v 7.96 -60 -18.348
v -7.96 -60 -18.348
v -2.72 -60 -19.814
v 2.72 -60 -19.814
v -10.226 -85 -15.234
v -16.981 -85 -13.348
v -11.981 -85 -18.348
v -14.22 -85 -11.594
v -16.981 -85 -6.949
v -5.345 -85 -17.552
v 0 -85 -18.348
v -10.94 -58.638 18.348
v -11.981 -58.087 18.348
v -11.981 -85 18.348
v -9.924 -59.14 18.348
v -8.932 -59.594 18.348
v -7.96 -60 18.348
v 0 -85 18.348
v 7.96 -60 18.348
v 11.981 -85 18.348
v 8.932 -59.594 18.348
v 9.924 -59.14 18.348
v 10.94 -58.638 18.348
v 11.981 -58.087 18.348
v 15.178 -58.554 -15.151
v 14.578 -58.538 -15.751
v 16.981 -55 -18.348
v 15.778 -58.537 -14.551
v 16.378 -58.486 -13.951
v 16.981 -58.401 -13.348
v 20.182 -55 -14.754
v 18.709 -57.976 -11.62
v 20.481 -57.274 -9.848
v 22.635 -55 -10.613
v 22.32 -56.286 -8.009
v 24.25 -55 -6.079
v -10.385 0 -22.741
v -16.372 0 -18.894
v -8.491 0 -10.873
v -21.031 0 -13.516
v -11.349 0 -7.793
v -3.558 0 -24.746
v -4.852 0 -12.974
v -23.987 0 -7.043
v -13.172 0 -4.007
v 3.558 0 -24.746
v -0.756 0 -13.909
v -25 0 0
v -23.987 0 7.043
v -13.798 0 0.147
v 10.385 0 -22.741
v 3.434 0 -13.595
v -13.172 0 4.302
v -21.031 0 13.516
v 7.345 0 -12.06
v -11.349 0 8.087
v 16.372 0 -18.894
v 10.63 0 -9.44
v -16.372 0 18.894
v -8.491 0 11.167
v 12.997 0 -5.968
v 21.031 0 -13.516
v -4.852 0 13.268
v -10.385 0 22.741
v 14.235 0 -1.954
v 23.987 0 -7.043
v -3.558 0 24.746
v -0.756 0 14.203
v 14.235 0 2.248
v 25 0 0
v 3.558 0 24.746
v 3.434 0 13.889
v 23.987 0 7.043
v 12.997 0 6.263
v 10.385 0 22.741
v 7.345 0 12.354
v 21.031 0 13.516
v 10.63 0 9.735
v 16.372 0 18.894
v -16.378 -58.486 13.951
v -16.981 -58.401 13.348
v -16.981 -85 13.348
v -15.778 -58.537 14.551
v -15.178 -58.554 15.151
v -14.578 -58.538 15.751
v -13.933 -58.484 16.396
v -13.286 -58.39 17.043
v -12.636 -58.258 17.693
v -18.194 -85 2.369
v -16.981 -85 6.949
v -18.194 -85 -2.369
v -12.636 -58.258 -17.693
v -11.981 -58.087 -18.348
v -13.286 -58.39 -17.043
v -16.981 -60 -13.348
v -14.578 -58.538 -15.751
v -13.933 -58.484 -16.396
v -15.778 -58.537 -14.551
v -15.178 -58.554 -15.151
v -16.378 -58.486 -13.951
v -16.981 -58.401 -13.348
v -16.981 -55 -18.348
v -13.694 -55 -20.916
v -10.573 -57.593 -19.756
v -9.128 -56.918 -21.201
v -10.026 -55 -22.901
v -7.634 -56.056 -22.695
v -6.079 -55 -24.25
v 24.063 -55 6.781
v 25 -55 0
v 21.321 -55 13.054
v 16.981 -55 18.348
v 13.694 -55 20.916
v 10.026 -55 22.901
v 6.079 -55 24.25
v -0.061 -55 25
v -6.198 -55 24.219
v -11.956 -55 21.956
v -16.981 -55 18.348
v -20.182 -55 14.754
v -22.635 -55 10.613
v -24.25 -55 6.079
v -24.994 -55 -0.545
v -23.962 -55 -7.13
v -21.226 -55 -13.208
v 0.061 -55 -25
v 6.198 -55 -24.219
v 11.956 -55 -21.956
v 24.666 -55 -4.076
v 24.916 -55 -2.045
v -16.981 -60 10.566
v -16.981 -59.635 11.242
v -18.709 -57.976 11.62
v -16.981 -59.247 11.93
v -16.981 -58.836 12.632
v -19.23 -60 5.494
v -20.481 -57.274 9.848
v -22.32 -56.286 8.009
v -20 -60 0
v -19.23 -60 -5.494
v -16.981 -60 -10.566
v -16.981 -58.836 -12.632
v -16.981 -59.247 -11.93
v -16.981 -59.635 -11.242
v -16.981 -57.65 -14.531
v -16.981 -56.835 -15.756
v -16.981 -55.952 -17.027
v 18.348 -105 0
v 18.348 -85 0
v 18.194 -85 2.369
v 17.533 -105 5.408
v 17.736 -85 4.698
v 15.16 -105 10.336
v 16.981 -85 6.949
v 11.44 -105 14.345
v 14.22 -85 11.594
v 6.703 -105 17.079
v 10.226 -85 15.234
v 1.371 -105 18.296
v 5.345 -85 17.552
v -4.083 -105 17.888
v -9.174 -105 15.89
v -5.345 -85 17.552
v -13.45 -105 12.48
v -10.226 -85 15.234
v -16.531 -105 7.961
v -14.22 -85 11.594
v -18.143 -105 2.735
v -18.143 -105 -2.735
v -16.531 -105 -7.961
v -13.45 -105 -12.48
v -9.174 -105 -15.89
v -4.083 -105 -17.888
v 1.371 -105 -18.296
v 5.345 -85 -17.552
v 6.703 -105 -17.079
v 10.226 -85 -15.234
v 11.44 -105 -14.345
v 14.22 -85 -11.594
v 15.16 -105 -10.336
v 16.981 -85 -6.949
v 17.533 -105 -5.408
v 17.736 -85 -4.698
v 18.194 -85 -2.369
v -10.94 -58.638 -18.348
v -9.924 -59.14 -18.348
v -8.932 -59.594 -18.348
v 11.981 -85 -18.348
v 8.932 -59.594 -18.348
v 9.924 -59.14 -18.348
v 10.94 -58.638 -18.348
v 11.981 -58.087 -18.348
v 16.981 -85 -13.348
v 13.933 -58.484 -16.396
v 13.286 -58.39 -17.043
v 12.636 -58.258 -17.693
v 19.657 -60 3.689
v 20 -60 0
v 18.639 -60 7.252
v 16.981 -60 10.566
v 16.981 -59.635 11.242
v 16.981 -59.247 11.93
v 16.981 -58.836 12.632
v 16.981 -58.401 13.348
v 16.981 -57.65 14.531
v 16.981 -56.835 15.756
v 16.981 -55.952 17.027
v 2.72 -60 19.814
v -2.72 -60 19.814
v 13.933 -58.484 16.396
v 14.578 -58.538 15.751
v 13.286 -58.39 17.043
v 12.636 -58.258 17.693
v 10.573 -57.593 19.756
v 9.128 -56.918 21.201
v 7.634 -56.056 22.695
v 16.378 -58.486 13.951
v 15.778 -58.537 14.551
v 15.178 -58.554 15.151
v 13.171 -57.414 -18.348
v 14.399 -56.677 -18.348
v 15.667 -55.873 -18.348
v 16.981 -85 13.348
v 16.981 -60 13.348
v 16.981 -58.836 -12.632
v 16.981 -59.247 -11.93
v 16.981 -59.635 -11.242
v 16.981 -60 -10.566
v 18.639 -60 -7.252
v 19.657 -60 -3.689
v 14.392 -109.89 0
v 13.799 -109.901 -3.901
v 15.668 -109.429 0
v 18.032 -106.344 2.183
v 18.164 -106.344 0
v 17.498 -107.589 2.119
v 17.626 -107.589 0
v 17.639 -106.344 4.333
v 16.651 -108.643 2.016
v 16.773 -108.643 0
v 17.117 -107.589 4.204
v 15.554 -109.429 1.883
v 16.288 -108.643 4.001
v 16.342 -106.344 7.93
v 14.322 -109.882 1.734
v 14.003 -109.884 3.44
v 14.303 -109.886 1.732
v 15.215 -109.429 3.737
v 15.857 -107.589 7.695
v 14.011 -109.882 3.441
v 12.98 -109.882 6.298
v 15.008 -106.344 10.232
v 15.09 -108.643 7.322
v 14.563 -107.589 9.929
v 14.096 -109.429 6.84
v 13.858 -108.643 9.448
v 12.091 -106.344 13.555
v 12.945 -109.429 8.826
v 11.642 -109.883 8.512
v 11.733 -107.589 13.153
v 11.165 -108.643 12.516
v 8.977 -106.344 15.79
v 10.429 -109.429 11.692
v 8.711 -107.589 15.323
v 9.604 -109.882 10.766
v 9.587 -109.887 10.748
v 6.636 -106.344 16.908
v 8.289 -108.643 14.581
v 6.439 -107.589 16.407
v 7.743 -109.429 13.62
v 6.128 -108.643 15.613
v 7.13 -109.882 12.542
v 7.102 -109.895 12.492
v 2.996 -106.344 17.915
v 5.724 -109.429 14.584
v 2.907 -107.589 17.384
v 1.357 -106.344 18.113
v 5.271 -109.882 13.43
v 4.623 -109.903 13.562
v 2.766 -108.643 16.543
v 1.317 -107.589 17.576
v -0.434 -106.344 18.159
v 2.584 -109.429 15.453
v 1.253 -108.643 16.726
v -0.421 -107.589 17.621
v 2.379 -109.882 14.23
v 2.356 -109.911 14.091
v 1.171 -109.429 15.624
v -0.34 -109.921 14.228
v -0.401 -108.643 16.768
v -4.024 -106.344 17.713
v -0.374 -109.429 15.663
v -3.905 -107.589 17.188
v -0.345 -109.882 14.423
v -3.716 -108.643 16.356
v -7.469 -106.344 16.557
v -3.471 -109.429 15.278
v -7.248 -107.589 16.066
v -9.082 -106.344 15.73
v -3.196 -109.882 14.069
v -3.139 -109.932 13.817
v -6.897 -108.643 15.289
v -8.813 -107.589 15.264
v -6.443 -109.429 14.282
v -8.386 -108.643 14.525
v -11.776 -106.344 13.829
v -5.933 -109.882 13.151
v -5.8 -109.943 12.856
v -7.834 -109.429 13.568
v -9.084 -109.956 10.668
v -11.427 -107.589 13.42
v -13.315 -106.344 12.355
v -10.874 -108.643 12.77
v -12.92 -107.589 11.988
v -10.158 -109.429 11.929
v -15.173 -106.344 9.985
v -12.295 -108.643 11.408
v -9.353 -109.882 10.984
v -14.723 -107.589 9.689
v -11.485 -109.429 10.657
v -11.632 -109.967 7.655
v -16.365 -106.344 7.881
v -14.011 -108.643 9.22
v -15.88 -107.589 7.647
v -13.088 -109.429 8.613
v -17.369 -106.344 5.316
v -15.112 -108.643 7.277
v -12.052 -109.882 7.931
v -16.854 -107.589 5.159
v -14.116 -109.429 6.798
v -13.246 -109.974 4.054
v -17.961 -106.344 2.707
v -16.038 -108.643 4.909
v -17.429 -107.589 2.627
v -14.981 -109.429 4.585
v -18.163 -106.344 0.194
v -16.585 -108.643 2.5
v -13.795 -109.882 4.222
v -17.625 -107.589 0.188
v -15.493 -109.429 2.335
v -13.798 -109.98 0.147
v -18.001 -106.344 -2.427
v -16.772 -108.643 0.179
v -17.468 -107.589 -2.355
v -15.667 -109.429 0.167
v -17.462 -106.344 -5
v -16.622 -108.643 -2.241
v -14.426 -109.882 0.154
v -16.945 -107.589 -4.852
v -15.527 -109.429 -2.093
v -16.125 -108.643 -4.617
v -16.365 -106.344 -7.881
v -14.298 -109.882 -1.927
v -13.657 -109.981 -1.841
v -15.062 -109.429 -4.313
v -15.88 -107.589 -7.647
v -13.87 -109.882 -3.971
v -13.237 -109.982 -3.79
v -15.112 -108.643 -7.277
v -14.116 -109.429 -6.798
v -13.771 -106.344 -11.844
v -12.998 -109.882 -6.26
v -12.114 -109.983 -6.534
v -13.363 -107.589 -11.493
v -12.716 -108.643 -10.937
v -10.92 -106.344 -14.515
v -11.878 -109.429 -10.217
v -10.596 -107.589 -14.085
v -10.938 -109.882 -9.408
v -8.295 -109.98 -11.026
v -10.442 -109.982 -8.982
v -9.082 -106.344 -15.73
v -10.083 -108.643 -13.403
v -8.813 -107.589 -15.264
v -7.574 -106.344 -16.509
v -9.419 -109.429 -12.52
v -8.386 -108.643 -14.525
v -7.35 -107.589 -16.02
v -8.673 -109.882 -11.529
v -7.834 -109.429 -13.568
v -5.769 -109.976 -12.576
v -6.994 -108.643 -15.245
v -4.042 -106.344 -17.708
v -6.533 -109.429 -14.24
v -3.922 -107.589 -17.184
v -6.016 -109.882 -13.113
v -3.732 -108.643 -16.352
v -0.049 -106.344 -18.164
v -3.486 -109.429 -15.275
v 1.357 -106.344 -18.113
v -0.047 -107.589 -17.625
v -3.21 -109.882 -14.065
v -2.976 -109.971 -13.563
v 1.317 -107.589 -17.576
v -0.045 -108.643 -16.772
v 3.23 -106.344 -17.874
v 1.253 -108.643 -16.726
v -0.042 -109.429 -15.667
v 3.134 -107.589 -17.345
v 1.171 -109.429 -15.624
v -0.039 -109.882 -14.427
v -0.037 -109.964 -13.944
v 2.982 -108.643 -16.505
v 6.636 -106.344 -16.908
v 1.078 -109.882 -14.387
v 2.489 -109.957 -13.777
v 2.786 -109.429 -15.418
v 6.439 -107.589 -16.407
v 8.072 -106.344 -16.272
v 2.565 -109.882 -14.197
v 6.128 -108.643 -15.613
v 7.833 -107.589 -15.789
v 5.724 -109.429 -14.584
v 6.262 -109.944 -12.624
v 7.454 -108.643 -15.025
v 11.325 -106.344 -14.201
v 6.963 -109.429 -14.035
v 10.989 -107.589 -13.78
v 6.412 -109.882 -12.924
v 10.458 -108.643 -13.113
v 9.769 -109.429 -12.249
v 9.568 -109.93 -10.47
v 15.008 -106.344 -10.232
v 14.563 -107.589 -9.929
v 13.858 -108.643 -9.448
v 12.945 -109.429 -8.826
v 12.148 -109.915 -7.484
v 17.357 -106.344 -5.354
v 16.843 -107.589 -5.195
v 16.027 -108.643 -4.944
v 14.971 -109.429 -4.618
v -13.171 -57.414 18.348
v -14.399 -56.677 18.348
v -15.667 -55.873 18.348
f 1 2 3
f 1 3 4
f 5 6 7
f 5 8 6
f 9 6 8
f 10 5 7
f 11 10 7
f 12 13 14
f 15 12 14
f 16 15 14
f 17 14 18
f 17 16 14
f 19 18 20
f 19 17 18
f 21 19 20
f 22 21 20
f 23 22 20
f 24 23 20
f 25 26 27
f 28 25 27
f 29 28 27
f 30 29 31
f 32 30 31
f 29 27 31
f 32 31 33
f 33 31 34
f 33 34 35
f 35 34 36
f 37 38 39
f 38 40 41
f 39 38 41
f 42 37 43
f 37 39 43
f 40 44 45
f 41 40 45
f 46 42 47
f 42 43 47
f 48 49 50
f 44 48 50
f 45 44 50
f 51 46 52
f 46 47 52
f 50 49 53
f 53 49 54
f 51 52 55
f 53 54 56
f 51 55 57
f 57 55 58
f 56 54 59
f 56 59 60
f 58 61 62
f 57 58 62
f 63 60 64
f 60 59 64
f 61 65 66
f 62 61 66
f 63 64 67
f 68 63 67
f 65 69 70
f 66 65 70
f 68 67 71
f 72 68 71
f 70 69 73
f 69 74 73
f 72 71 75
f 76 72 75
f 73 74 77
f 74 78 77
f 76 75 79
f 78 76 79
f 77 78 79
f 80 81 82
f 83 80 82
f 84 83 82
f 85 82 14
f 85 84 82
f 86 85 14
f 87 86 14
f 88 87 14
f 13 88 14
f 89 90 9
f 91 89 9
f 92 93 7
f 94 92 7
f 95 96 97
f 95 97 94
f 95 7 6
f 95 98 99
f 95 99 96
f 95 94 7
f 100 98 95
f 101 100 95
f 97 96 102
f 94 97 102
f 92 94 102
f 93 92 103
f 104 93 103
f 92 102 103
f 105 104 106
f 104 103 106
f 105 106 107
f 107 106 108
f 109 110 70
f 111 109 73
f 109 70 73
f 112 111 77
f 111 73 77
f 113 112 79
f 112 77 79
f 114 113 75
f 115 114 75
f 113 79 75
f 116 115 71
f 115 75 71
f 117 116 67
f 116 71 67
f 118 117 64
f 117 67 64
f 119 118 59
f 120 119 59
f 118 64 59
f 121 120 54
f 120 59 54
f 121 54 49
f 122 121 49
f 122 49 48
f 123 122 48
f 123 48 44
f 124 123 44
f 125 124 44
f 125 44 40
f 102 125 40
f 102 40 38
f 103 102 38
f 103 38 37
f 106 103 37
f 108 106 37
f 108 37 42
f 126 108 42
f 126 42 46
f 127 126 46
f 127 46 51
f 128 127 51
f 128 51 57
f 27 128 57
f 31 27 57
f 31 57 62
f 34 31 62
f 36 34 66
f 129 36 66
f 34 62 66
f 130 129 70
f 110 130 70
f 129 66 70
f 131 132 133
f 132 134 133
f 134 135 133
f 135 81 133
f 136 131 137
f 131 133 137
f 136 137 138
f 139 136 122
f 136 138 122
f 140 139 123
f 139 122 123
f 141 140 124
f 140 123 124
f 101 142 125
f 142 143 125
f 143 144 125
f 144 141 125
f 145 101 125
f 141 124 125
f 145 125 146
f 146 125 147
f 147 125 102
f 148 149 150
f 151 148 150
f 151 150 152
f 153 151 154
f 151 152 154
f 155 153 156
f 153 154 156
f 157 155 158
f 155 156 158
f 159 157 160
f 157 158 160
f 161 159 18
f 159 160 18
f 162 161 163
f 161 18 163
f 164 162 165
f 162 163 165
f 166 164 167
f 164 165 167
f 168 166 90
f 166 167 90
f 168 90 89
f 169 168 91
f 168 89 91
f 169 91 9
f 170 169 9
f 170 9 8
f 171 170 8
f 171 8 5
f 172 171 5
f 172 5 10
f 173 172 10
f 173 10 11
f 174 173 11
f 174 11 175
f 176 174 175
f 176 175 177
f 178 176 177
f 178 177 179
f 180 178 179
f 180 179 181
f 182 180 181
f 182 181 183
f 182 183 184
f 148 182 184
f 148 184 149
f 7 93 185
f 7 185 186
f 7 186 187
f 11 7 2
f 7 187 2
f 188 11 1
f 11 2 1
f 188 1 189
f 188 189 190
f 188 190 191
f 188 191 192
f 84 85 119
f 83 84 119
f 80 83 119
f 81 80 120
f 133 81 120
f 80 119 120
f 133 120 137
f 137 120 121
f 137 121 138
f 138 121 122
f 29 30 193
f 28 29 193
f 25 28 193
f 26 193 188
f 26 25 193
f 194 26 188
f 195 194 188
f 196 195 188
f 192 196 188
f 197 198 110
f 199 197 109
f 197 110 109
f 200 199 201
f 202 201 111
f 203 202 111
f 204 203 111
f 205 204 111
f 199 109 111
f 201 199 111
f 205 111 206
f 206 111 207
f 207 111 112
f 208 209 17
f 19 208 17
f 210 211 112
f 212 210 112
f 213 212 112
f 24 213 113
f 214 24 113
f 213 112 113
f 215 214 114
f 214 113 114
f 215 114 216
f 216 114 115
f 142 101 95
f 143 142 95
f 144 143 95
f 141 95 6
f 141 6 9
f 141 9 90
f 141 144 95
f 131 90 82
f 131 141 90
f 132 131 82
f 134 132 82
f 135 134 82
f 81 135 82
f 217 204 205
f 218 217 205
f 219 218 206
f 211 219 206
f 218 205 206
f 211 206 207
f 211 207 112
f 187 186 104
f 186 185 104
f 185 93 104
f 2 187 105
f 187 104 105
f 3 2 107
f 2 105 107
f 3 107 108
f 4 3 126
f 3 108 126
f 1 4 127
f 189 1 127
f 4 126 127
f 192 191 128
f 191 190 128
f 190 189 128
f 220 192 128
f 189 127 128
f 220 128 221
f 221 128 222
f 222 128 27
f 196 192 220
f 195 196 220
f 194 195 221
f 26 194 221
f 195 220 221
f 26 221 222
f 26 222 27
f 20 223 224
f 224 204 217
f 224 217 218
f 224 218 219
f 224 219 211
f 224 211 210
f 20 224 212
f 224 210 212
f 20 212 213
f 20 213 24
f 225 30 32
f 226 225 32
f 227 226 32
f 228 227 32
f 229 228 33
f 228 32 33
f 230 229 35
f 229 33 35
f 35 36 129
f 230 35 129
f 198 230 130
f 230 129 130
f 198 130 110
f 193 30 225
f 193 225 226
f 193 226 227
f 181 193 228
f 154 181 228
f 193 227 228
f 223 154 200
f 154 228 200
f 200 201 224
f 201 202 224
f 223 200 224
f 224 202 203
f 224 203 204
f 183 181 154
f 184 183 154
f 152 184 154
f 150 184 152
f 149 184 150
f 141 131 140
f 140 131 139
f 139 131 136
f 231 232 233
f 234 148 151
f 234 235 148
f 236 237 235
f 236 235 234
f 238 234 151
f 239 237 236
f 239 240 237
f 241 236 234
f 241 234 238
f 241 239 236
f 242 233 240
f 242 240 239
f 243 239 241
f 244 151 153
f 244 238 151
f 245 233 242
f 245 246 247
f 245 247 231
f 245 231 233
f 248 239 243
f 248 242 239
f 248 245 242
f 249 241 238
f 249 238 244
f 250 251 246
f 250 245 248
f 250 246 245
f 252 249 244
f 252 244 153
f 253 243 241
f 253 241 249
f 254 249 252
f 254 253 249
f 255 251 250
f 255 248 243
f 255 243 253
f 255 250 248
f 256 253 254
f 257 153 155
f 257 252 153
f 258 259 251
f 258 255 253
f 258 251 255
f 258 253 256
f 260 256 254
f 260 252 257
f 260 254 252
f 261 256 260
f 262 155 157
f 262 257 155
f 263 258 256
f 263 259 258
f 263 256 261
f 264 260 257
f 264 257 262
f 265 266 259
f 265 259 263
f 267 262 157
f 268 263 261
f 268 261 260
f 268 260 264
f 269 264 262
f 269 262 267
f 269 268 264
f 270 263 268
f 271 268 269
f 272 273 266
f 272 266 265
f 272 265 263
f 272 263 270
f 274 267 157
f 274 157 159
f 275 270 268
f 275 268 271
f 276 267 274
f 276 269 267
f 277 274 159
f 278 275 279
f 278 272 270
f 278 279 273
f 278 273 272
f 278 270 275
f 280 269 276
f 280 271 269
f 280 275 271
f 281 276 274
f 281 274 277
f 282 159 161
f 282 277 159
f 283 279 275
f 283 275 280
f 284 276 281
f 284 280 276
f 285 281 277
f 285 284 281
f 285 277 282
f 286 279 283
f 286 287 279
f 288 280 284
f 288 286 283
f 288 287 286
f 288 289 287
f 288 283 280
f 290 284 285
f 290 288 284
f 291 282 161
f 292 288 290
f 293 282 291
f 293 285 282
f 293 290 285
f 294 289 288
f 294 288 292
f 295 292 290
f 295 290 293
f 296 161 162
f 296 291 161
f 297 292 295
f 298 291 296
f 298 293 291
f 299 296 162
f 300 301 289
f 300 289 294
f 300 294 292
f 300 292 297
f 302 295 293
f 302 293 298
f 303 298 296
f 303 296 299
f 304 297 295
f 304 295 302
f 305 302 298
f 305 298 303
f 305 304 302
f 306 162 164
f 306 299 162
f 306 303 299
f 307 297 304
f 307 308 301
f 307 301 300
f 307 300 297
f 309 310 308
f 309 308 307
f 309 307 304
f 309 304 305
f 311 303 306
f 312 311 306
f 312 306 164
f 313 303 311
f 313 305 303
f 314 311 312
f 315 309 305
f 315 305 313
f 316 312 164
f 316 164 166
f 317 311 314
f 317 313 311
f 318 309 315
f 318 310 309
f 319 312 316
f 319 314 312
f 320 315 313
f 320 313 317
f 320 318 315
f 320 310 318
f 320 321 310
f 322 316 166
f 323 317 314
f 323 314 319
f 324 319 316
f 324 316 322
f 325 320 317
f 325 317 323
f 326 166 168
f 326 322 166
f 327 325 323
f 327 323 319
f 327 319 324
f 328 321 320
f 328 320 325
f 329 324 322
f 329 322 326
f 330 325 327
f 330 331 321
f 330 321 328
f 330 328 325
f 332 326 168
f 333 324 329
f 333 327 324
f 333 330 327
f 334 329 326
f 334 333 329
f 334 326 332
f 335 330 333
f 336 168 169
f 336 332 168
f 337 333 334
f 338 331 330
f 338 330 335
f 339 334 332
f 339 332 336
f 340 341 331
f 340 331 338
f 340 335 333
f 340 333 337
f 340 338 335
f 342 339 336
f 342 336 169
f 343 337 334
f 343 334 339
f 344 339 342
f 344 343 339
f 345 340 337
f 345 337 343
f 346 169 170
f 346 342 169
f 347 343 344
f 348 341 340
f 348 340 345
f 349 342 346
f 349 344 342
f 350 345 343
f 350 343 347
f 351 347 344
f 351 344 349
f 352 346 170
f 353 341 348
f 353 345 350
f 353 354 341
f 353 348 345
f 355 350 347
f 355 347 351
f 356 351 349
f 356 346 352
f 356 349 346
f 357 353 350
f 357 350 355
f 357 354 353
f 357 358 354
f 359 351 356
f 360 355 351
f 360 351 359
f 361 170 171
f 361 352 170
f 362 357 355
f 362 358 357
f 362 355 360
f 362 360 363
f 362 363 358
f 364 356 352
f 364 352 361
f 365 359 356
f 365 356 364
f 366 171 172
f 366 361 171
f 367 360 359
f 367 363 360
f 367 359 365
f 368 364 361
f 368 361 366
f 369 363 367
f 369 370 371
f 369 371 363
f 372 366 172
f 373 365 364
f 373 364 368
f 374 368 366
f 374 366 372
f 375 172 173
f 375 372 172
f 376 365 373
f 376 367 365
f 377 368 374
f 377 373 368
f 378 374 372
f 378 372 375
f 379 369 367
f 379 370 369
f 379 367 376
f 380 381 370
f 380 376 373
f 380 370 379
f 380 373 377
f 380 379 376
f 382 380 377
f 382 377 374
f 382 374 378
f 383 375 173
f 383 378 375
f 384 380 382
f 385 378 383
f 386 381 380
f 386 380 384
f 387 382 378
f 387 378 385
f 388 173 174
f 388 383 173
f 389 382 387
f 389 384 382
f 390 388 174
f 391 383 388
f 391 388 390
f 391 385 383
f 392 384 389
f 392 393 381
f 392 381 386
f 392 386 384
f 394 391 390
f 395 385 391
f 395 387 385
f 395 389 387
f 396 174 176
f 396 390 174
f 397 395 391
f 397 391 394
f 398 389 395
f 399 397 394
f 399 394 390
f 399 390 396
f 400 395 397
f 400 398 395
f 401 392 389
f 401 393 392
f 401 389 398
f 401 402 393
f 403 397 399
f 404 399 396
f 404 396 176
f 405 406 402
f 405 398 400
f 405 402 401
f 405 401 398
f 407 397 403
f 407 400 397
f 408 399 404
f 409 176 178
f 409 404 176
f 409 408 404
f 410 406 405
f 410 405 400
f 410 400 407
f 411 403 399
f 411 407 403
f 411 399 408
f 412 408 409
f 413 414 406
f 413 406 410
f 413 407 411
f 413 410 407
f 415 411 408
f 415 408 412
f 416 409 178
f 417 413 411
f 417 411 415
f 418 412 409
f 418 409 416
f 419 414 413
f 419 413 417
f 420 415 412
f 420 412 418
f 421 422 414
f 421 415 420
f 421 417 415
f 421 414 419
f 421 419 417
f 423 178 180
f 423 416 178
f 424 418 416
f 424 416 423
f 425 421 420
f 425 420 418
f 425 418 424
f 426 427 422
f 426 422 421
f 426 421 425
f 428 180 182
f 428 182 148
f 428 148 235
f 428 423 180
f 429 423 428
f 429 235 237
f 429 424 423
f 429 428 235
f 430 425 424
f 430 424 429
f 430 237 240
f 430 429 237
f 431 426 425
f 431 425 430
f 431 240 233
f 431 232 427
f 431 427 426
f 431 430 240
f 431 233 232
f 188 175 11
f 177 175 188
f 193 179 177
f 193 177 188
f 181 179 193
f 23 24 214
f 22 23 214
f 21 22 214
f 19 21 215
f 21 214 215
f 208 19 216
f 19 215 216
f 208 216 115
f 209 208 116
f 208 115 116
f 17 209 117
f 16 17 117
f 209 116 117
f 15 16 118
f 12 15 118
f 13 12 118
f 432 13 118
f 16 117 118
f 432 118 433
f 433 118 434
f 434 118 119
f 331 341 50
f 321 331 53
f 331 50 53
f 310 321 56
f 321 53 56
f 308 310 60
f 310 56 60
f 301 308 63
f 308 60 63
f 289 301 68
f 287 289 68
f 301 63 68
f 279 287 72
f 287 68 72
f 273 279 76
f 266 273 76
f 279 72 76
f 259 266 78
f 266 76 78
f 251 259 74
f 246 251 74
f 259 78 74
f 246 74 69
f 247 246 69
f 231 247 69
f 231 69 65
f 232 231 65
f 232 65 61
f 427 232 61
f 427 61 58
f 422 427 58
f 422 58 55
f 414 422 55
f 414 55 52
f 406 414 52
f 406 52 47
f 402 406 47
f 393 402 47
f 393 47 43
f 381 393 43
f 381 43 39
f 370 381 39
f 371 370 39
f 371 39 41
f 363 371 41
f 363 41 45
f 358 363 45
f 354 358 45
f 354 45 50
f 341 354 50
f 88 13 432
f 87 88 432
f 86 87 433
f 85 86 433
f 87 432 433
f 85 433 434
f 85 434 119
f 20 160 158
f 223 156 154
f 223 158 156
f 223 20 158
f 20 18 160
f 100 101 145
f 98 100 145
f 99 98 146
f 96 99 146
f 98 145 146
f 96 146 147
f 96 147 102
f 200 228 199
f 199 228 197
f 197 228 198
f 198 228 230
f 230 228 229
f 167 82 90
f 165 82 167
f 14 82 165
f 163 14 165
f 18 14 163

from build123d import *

# Parameters (mm, degrees)
F0_R         = 25
F1_DEPTH     = 60
F2_W         = 33.9622593881
F2_H         = 36.695571085
F3_DEPTH     = 25
F4_R         = 18.3477855425
F5_DEPTH     = 25.0000003725
F6_R         = 5
F8_T1_DEPTH  = 37.8584149398
F8_T6_ANGLE  = 94.4306250519
F8_T11_ANGLE = 94.4306250519
F8_T16_ANGLE = 94.4306250519
F8_T21_ANGLE = 47.2153125259
F8_T26_ANGLE = 47.2153125259
F8_T31_ANGLE = 47.2153125259
F8_T36_ANGLE = 47.2153125259
F8_T41_ANGLE = 85.5693749481
F8_T46_ANGLE = 85.5693749481
F8_T51_ANGLE = 85.5693749481
F8_T56_ANGLE = 85.5693749481
F8_T61_ANGLE = 85.5693749481
F8_T66_ANGLE = 85.5693749481
F9_R         = 14.0953649679
F10_DEPTH    = 200


# Not quite as in the source:
# - a fillet or chamfer that OpenCascade refuses, or shapes differently, is made with other operations: its cross-section is extruded or revolved along the edge and cut away or added
# - a feature of the source that left no trace in its solid (it failed there, or was rolled back) is left out


with BuildPart() as f1:
    # F0 (on Front) → F1 (new body)
    with BuildSketch(Plane.XZ):
        Circle(F0_R)
    extrude(amount=F1_DEPTH)

    # F2 (on face) → F3 (join)
    with BuildSketch(Plane.XZ.offset(60)):
        Rectangle(F2_W, F2_H)
    extrude(amount=F3_DEPTH)

    # F4 (on face) → F5 (join)
    with BuildSketch(Plane.XZ.offset(85)):
        Circle(F4_R)
    extrude(amount=F5_DEPTH)

    # F6
    f6_edges = [f1.edges().sort_by_distance(p)[0] for p in [
        (-18.347786, -110, 0),
    ]]
    fillet(f6_edges, radius=F6_R)

    # F8: chamfer of 5 on 9 edges, made by hand

    # F8_s2 → F8_t1 (cut)
    with BuildSketch(Plane.XZ.offset(60)):
        Polygon((16.9811296941, -13.3477855425), (11.9811296941, -18.3477855425), (16.9811296941, -18.3477855425), align=None)
        Polygon((16.9811296941, 13.3477855425), (11.9811296941, 18.3477855425), (16.9811296941, 18.3477855425), align=None)
        Polygon((-11.9811296941, -18.3477855425), (-16.9811296941, -13.3477855425), (-16.9811296941, -18.3477855425), align=None)
        Polygon((-16.9811296941, 13.3477855425), (-11.9811296941, 18.3477855425), (-16.9811296941, 18.3477855425), align=None)
    extrude(amount=F8_T1_DEPTH, mode=Mode.SUBTRACT)


with BuildPart() as f8_tool4:
    # F8_s5 → F8_t6 (revolve)
    with BuildSketch(Plane(origin=(0, 0, 0), x_dir=(0, 1, 0), z_dir=(0.7339114217, 0, 0.6792451878))):
        Polygon((-60, 20), (-55, 25), (-60, 25), align=None)
    revolve(axis=Axis((0, -60, 0), (0, -1, 0)), revolution_arc=F8_T6_ANGLE)

    split(bisect_by=Plane(origin=(-15.1644576183, 0, 15.1644576183), x_dir=(0, 1, 0), z_dir=(-0.7071067812, 0, 0.7071067812)), keep=Keep.TOP)


with BuildPart() as f1_1:
    add(f1.part)

    # F8_t3: cut F8_tool4
    add(f8_tool4.part, mode=Mode.SUBTRACT)


with BuildPart() as f8_tool9:
    # F8_s10 → F8_t11 (revolve)
    with BuildSketch(Plane(origin=(0, 0, 0), x_dir=(0, 1, 0), z_dir=(0.7339114217, 0, 0.6792451878))):
        Polygon((-60, 20), (-55, 25), (-60, 25), align=None)
    revolve(axis=Axis((0, -60, 0), (0, -1, 0)), revolution_arc=F8_T11_ANGLE)

    split(bisect_by=Plane.YZ.offset(-16.9811296941), keep=Keep.BOTTOM)


with BuildPart() as f1_2:
    add(f1_1.part)

    # F8_t8: cut F8_tool9
    add(f8_tool9.part, mode=Mode.SUBTRACT)


with BuildPart() as f8_tool14:
    # F8_s15 → F8_t16 (revolve)
    with BuildSketch(Plane(origin=(0, 0, 0), x_dir=(0, 1, 0), z_dir=(0.7339114217, 0, 0.6792451878))):
        Polygon((-60, 20), (-55, 25), (-60, 25), align=None)
    revolve(axis=Axis((0, -60, 0), (0, -1, 0)), revolution_arc=F8_T16_ANGLE)

    split(bisect_by=Plane(origin=(-15.1644576183, 0, -15.1644576183), x_dir=(0, 1, 0), z_dir=(-0.7071067812, 0, -0.7071067812)), keep=Keep.TOP)


with BuildPart() as f1_3:
    add(f1_2.part)

    # F8_t13: cut F8_tool14
    add(f8_tool14.part, mode=Mode.SUBTRACT)


with BuildPart() as f8_tool19:
    # F8_s20 → F8_t21 (revolve)
    with BuildSketch(Plane(origin=(0, 0, 0), x_dir=(0, 1, 0), z_dir=(-0.7339114217, 0, -0.6792451878))):
        Polygon((-60, 20), (-55, 25), (-60, 25), align=None)
    revolve(axis=Axis((0, -60, 0), (0, -1, 0)), revolution_arc=F8_T21_ANGLE)

    split(bisect_by=Plane(origin=(15.1644576183, 0, -15.1644576183), x_dir=(0, 1, 0), z_dir=(0.7071067812, 0, -0.7071067812)), keep=Keep.TOP)


with BuildPart() as f1_4:
    add(f1_3.part)

    # F8_t18: cut F8_tool19
    add(f8_tool19.part, mode=Mode.SUBTRACT)


with BuildPart() as f8_tool24:
    # F8_s25 → F8_t26 (revolve)
    with BuildSketch(Plane(origin=(0, 0, 0), x_dir=(0, 1, 0), z_dir=(-0.7339114217, 0, -0.6792451878))):
        Polygon((-60, 20), (-55, 25), (-60, 25), align=None)
    revolve(axis=Axis((0, -60, 0), (0, -1, 0)), revolution_arc=F8_T26_ANGLE)

    split(bisect_by=Plane.YZ.offset(16.9811296941), keep=Keep.TOP)


with BuildPart() as f1_5:
    add(f1_4.part)

    # F8_t23: cut F8_tool24
    add(f8_tool24.part, mode=Mode.SUBTRACT)


with BuildPart() as f8_tool29:
    # F8_s30 → F8_t31 (revolve)
    with BuildSketch(Plane.XY):
        Polygon((20, -60), (25, -55), (25, -60), align=None)
    revolve(axis=Axis((0, -60, 0), (0, -1, 0)), revolution_arc=F8_T31_ANGLE)

    split(bisect_by=Plane.YZ.offset(16.9811296941), keep=Keep.TOP)


with BuildPart() as f1_6:
    add(f1_5.part)

    # F8_t28: cut F8_tool29
    add(f8_tool29.part, mode=Mode.SUBTRACT)


with BuildPart() as f8_tool34:
    # F8_s35 → F8_t36 (revolve)
    with BuildSketch(Plane.XY):
        Polygon((20, -60), (25, -55), (25, -60), align=None)
    revolve(axis=Axis((0, -60, 0), (0, -1, 0)), revolution_arc=F8_T36_ANGLE)

    split(bisect_by=Plane(origin=(15.1644576183, 0, 15.1644576183), x_dir=(0, 1, 0), z_dir=(0.7071067812, 0, 0.7071067812)), keep=Keep.TOP)


with BuildPart() as f1_7:
    add(f1_6.part)

    # F8_t33: cut F8_tool34
    add(f8_tool34.part, mode=Mode.SUBTRACT)


with BuildPart() as f8_tool39:
    # F8_s40 → F8_t41 (revolve)
    with BuildSketch(Plane(origin=(0, 0, 0), x_dir=(0, 1, 0), z_dir=(-0.7339114217, 0, 0.6792451878))):
        Polygon((-60, 20), (-55, 25), (-60, 25), align=None)
    revolve(axis=Axis((0, -60, 0), (0, -1, 0)), revolution_arc=F8_T41_ANGLE)

    split(bisect_by=Plane(origin=(-15.1644576183, 0, -15.1644576183), x_dir=(0, 1, 0), z_dir=(-0.7071067812, 0, -0.7071067812)), keep=Keep.TOP)


with BuildPart() as f1_8:
    add(f1_7.part)

    # F8_t38: cut F8_tool39
    add(f8_tool39.part, mode=Mode.SUBTRACT)


with BuildPart() as f8_tool44:
    # F8_s45 → F8_t46 (revolve)
    with BuildSketch(Plane(origin=(0, 0, 0), x_dir=(0, 1, 0), z_dir=(-0.7339114217, 0, 0.6792451878))):
        Polygon((-60, 20), (-55, 25), (-60, 25), align=None)
    revolve(axis=Axis((0, -60, 0), (0, -1, 0)), revolution_arc=F8_T46_ANGLE)

    split(bisect_by=Plane.XY.offset(-18.3477855425), keep=Keep.BOTTOM)


with BuildPart() as f1_9:
    add(f1_8.part)

    # F8_t43: cut F8_tool44
    add(f8_tool44.part, mode=Mode.SUBTRACT)


with BuildPart() as f8_tool49:
    # F8_s50 → F8_t51 (revolve)
    with BuildSketch(Plane(origin=(0, 0, 0), x_dir=(0, 1, 0), z_dir=(-0.7339114217, 0, 0.6792451878))):
        Polygon((-60, 20), (-55, 25), (-60, 25), align=None)
    revolve(axis=Axis((0, -60, 0), (0, -1, 0)), revolution_arc=F8_T51_ANGLE)

    split(bisect_by=Plane(origin=(15.1644576183, 0, -15.1644576183), x_dir=(0, 1, 0), z_dir=(0.7071067812, 0, -0.7071067812)), keep=Keep.TOP)


with BuildPart() as f1_10:
    add(f1_9.part)

    # F8_t48: cut F8_tool49
    add(f8_tool49.part, mode=Mode.SUBTRACT)


with BuildPart() as f8_tool54:
    # F8_s55 → F8_t56 (revolve)
    with BuildSketch(Plane(origin=(0, 0, 0), x_dir=(0, 1, 0), z_dir=(0.7339114217, 0, -0.6792451878))):
        Polygon((-60, 20), (-55, 25), (-60, 25), align=None)
    revolve(axis=Axis((0, -60, 0), (0, -1, 0)), revolution_arc=F8_T56_ANGLE)

    split(bisect_by=Plane(origin=(15.1644576183, 0, 15.1644576183), x_dir=(0, 1, 0), z_dir=(0.7071067812, 0, 0.7071067812)), keep=Keep.TOP)


with BuildPart() as f1_11:
    add(f1_10.part)

    # F8_t53: cut F8_tool54
    add(f8_tool54.part, mode=Mode.SUBTRACT)


with BuildPart() as f8_tool59:
    # F8_s60 → F8_t61 (revolve)
    with BuildSketch(Plane(origin=(0, 0, 0), x_dir=(0, 1, 0), z_dir=(0.7339114217, 0, -0.6792451878))):
        Polygon((-60, 20), (-55, 25), (-60, 25), align=None)
    revolve(axis=Axis((0, -60, 0), (0, -1, 0)), revolution_arc=F8_T61_ANGLE)

    split(bisect_by=Plane.XY.offset(18.3477855425), keep=Keep.TOP)


with BuildPart() as f1_12:
    add(f1_11.part)

    # F8_t58: cut F8_tool59
    add(f8_tool59.part, mode=Mode.SUBTRACT)


with BuildPart() as f8_tool64:
    # F8_s65 → F8_t66 (revolve)
    with BuildSketch(Plane(origin=(0, 0, 0), x_dir=(0, 1, 0), z_dir=(0.7339114217, 0, -0.6792451878))):
        Polygon((-60, 20), (-55, 25), (-60, 25), align=None)
    revolve(axis=Axis((0, -60, 0), (0, -1, 0)), revolution_arc=F8_T66_ANGLE)

    split(bisect_by=Plane(origin=(-15.1644576183, 0, 15.1644576183), x_dir=(0, 1, 0), z_dir=(-0.7071067812, 0, 0.7071067812)), keep=Keep.TOP)


with BuildPart() as f1_13:
    add(f1_12.part)

    # F8_t63: cut F8_tool64
    add(f8_tool64.part, mode=Mode.SUBTRACT)

    # F9 (on face) → F10 (cut)
    with BuildSketch(Plane(origin=(0, 0, 0), x_dir=(-1, 0, 0), z_dir=(0, 1, 0))):
        with Locations((-0.2972558141, 0.1472756267)):
            Circle(F9_R)
    extrude(amount=-F10_DEPTH, mode=Mode.SUBTRACT)


solid = f1_13.part
